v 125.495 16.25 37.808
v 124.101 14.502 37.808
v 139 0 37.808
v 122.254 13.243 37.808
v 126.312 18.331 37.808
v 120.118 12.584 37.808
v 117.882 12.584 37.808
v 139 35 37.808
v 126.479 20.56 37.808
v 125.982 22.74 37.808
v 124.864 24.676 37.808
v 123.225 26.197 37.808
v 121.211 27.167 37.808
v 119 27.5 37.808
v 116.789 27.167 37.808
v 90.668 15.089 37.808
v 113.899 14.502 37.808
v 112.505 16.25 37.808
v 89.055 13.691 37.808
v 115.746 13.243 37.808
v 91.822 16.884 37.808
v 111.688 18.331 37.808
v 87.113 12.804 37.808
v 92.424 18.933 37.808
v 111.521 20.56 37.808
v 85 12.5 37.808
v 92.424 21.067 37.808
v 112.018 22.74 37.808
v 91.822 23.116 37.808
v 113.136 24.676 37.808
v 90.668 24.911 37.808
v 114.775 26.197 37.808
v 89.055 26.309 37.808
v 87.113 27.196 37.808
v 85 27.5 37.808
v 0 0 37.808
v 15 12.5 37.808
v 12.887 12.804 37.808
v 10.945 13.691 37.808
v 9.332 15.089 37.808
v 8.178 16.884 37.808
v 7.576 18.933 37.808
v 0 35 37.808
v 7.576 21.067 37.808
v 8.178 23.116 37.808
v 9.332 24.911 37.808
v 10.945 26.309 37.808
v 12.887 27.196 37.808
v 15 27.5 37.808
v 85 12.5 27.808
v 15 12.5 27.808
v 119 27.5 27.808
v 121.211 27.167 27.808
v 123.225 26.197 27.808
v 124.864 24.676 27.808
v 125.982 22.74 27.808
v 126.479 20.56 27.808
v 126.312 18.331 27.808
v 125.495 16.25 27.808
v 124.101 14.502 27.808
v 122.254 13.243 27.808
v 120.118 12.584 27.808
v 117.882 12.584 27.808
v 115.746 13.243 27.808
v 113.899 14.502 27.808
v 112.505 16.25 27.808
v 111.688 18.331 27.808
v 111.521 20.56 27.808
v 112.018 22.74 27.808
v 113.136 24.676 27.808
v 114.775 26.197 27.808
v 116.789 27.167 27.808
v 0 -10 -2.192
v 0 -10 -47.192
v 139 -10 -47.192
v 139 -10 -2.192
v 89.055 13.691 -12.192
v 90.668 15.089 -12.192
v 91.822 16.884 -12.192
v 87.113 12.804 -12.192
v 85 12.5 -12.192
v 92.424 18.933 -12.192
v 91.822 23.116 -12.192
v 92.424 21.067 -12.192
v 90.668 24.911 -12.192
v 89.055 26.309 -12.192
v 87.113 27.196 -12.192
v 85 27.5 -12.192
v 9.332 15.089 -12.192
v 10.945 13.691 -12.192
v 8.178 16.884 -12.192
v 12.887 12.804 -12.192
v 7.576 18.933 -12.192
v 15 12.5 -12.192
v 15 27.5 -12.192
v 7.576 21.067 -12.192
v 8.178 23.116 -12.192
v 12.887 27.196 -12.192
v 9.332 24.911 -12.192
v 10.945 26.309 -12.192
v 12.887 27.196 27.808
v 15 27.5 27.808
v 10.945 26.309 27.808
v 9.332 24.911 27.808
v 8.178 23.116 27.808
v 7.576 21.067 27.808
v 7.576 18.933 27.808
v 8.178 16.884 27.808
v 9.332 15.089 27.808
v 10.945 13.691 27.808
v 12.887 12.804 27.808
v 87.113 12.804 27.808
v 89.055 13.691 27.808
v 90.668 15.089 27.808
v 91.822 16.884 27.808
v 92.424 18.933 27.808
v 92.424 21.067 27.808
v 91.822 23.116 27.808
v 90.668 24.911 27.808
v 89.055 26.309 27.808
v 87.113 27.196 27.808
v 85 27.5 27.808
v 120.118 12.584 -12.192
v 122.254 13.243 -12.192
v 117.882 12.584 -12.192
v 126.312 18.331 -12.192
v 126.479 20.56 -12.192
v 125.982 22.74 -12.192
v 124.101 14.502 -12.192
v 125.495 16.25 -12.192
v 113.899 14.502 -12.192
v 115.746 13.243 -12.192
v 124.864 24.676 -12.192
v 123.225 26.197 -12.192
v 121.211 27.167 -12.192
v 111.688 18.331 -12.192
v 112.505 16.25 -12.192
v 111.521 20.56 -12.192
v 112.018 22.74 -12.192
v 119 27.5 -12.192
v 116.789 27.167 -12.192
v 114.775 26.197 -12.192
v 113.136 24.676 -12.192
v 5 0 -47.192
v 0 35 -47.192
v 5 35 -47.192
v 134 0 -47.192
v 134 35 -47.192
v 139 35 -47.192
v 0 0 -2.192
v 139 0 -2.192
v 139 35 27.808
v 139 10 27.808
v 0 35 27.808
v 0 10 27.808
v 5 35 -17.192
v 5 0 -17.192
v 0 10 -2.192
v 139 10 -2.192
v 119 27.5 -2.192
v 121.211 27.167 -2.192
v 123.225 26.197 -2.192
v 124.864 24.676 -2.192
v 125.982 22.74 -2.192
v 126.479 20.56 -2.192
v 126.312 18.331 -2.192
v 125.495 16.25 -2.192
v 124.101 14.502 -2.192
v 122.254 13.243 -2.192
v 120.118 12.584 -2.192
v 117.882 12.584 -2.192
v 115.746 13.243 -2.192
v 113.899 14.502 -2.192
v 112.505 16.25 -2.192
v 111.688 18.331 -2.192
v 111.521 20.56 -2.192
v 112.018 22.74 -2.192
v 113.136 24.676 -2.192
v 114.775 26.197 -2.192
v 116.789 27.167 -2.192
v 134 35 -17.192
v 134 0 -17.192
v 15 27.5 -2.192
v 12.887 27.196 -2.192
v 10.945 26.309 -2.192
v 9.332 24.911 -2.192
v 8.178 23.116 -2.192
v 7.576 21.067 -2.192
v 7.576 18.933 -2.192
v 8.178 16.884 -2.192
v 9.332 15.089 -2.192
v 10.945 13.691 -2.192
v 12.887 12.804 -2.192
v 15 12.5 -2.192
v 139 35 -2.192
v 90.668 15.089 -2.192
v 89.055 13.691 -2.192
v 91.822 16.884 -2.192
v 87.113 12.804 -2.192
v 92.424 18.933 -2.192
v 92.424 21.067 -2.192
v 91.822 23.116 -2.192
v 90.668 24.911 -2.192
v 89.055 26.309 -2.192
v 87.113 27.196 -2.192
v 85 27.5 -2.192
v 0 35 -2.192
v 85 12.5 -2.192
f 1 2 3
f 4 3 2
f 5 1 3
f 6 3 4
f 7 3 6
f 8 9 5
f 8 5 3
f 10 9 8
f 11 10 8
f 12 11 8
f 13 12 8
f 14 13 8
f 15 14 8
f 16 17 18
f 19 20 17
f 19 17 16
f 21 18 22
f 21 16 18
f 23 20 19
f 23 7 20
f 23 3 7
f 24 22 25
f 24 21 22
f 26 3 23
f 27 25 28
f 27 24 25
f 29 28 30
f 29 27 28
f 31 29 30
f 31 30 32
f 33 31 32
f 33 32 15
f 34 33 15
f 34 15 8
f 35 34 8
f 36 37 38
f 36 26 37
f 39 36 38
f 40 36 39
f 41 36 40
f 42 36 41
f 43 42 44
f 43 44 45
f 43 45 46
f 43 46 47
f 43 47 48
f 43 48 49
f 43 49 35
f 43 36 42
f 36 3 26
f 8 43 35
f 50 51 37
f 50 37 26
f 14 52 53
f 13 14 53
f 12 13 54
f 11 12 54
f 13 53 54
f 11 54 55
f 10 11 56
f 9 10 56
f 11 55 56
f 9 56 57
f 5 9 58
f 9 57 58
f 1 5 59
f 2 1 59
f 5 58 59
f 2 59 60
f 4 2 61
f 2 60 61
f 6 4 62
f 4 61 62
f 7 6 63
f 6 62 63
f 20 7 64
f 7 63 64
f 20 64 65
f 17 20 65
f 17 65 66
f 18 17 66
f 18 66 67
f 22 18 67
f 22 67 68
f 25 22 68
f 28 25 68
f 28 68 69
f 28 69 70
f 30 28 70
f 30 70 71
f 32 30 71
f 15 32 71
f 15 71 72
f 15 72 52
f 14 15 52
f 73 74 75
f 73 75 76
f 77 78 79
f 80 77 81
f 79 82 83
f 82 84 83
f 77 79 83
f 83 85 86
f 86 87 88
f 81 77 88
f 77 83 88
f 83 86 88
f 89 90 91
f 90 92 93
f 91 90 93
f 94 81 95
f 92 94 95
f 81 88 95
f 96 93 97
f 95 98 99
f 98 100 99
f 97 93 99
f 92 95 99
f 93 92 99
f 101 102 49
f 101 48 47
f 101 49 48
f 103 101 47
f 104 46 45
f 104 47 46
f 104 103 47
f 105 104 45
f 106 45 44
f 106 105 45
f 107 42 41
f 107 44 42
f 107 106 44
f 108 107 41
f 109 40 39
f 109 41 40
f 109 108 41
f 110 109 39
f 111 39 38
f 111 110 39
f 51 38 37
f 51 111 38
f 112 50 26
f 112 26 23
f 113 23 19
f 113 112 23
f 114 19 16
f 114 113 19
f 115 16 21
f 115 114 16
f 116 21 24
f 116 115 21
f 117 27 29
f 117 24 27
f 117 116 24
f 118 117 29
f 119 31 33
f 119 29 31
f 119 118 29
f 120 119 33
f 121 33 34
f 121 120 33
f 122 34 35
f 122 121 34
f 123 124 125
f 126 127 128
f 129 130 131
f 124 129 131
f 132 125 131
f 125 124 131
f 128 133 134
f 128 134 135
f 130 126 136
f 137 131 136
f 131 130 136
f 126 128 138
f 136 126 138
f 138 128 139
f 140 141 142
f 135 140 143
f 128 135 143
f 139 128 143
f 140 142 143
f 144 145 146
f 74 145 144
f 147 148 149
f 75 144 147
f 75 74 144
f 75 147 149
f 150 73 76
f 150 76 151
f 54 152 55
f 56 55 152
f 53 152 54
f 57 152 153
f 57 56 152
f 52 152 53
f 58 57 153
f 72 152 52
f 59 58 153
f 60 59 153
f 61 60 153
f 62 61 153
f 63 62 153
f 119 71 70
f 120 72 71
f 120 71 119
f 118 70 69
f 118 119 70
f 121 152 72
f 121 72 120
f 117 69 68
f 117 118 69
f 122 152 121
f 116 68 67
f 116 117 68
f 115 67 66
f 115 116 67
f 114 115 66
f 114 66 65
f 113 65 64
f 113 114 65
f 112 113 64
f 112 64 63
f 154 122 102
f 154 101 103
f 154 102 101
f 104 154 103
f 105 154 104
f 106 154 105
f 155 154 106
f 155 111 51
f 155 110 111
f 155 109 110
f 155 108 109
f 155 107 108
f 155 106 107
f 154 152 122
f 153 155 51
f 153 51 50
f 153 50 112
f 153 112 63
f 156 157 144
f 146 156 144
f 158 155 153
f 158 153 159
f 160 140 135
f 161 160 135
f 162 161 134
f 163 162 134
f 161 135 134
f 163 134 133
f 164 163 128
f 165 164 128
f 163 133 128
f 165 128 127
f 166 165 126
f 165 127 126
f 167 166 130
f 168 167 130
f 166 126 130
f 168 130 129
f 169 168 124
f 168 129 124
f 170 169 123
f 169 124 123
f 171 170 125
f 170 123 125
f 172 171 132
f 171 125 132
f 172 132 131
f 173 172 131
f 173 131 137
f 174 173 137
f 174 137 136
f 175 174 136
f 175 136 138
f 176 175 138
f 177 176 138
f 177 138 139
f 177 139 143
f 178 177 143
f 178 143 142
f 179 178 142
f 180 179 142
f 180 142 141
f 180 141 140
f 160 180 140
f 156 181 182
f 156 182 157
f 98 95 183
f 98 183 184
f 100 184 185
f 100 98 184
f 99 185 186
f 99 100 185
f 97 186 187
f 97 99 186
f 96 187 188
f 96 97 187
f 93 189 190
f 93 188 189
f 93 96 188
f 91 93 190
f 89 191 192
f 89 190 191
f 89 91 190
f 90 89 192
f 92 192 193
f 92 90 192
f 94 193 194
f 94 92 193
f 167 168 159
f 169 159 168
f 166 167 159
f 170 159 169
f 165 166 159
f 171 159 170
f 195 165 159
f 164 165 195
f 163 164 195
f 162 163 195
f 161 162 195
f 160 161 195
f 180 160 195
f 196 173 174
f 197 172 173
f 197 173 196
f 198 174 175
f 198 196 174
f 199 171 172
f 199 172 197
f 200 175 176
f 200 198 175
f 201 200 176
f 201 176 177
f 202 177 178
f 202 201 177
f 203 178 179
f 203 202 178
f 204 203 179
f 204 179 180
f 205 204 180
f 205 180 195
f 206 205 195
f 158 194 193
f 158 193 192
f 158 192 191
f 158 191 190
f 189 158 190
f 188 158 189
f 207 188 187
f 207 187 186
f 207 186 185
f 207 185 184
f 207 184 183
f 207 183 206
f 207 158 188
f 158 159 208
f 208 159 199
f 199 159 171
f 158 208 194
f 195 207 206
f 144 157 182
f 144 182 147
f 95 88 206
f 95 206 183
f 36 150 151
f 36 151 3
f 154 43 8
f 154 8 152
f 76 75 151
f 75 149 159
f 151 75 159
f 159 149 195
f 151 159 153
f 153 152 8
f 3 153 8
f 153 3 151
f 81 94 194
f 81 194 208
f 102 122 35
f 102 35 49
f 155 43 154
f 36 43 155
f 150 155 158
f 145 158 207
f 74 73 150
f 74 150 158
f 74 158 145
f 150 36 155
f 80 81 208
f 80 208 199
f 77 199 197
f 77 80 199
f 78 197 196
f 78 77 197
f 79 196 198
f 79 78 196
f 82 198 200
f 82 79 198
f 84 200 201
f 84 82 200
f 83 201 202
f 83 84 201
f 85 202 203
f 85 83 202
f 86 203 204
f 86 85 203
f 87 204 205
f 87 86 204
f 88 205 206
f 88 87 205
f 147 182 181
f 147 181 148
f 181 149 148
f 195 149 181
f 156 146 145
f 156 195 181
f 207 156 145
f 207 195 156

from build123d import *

# Parameters (mm, degrees)
BOSS_EXTRUDE1_DEPTH = 139
SKETCH5_R           = 7.5
CUT_EXTRUDE1_DEPTH  = 152.809090637
SKETCH6_W           = 5
SKETCH6_H           = 35
BOSS_EXTRUDE2_DEPTH = 35
SKETCH7_W           = 129
SKETCH7_H           = 35
BOSS_EXTRUDE3_DEPTH = 5


with BuildPart() as part:
    # Sketch3 → Boss-Extrude1 (new body)
    with BuildSketch(Plane(origin=(0, 0, 0), x_dir=(0, 0, -1), z_dir=(1, 0, 0))):
        Polygon((-27.8080918, 35), (-27.8080918, 10), (2.1919082, 10), (2.1919082, 35), (12.1919082, 35), (12.1919082, 0), (47.1919082, 0), (47.1919082, -10), (2.1919082, -10), (2.1919082, 0), (-37.8080918, 0), (-37.8080918, 35), align=None)
    extrude(amount=BOSS_EXTRUDE1_DEPTH)

    # Sketch5 → Cut-Extrude1 (cut, through all)
    with BuildSketch(Plane(origin=(0, 0, -12.1919082), x_dir=(-1, 0, 0), z_dir=(0, 0, -1))):
        with Locations(Location((-119, 20, 0), (0, 0, 90))):
            Circle(SKETCH5_R)
        with BuildLine():
            Line((-85, 27.5), (-15, 27.5))
            ThreePointArc((-15, 27.5), (-7.5, 20), (-15, 12.5))
            Line((-15, 12.5), (-85, 12.5))
            ThreePointArc((-85, 12.5), (-92.5, 20), (-85, 27.5))
        make_face()
    extrude(amount=-CUT_EXTRUDE1_DEPTH, mode=Mode.SUBTRACT)

    # Sketch6 → Boss-Extrude2 (add)
    with BuildSketch(Plane(origin=(0, 0, 0), x_dir=(1, 0, 0), z_dir=(0, 1, 0))):
        with Locations((2.5, 29.6919082)):
            Rectangle(SKETCH6_W, SKETCH6_H)
        with Locations((136.5, 29.6919082)):
            Rectangle(SKETCH6_W, SKETCH6_H)
    extrude(amount=BOSS_EXTRUDE2_DEPTH)

    # Sketch7 → Boss-Extrude3 (add)
    with BuildSketch(Plane(origin=(0, 0, -12.1919082), x_dir=(-1, 0, 0), z_dir=(0, 0, -1))):
        with Locations((-69.5, 17.5)):
            Rectangle(SKETCH7_W, SKETCH7_H)
    extrude(amount=BOSS_EXTRUDE3_DEPTH)


solid = part.part
